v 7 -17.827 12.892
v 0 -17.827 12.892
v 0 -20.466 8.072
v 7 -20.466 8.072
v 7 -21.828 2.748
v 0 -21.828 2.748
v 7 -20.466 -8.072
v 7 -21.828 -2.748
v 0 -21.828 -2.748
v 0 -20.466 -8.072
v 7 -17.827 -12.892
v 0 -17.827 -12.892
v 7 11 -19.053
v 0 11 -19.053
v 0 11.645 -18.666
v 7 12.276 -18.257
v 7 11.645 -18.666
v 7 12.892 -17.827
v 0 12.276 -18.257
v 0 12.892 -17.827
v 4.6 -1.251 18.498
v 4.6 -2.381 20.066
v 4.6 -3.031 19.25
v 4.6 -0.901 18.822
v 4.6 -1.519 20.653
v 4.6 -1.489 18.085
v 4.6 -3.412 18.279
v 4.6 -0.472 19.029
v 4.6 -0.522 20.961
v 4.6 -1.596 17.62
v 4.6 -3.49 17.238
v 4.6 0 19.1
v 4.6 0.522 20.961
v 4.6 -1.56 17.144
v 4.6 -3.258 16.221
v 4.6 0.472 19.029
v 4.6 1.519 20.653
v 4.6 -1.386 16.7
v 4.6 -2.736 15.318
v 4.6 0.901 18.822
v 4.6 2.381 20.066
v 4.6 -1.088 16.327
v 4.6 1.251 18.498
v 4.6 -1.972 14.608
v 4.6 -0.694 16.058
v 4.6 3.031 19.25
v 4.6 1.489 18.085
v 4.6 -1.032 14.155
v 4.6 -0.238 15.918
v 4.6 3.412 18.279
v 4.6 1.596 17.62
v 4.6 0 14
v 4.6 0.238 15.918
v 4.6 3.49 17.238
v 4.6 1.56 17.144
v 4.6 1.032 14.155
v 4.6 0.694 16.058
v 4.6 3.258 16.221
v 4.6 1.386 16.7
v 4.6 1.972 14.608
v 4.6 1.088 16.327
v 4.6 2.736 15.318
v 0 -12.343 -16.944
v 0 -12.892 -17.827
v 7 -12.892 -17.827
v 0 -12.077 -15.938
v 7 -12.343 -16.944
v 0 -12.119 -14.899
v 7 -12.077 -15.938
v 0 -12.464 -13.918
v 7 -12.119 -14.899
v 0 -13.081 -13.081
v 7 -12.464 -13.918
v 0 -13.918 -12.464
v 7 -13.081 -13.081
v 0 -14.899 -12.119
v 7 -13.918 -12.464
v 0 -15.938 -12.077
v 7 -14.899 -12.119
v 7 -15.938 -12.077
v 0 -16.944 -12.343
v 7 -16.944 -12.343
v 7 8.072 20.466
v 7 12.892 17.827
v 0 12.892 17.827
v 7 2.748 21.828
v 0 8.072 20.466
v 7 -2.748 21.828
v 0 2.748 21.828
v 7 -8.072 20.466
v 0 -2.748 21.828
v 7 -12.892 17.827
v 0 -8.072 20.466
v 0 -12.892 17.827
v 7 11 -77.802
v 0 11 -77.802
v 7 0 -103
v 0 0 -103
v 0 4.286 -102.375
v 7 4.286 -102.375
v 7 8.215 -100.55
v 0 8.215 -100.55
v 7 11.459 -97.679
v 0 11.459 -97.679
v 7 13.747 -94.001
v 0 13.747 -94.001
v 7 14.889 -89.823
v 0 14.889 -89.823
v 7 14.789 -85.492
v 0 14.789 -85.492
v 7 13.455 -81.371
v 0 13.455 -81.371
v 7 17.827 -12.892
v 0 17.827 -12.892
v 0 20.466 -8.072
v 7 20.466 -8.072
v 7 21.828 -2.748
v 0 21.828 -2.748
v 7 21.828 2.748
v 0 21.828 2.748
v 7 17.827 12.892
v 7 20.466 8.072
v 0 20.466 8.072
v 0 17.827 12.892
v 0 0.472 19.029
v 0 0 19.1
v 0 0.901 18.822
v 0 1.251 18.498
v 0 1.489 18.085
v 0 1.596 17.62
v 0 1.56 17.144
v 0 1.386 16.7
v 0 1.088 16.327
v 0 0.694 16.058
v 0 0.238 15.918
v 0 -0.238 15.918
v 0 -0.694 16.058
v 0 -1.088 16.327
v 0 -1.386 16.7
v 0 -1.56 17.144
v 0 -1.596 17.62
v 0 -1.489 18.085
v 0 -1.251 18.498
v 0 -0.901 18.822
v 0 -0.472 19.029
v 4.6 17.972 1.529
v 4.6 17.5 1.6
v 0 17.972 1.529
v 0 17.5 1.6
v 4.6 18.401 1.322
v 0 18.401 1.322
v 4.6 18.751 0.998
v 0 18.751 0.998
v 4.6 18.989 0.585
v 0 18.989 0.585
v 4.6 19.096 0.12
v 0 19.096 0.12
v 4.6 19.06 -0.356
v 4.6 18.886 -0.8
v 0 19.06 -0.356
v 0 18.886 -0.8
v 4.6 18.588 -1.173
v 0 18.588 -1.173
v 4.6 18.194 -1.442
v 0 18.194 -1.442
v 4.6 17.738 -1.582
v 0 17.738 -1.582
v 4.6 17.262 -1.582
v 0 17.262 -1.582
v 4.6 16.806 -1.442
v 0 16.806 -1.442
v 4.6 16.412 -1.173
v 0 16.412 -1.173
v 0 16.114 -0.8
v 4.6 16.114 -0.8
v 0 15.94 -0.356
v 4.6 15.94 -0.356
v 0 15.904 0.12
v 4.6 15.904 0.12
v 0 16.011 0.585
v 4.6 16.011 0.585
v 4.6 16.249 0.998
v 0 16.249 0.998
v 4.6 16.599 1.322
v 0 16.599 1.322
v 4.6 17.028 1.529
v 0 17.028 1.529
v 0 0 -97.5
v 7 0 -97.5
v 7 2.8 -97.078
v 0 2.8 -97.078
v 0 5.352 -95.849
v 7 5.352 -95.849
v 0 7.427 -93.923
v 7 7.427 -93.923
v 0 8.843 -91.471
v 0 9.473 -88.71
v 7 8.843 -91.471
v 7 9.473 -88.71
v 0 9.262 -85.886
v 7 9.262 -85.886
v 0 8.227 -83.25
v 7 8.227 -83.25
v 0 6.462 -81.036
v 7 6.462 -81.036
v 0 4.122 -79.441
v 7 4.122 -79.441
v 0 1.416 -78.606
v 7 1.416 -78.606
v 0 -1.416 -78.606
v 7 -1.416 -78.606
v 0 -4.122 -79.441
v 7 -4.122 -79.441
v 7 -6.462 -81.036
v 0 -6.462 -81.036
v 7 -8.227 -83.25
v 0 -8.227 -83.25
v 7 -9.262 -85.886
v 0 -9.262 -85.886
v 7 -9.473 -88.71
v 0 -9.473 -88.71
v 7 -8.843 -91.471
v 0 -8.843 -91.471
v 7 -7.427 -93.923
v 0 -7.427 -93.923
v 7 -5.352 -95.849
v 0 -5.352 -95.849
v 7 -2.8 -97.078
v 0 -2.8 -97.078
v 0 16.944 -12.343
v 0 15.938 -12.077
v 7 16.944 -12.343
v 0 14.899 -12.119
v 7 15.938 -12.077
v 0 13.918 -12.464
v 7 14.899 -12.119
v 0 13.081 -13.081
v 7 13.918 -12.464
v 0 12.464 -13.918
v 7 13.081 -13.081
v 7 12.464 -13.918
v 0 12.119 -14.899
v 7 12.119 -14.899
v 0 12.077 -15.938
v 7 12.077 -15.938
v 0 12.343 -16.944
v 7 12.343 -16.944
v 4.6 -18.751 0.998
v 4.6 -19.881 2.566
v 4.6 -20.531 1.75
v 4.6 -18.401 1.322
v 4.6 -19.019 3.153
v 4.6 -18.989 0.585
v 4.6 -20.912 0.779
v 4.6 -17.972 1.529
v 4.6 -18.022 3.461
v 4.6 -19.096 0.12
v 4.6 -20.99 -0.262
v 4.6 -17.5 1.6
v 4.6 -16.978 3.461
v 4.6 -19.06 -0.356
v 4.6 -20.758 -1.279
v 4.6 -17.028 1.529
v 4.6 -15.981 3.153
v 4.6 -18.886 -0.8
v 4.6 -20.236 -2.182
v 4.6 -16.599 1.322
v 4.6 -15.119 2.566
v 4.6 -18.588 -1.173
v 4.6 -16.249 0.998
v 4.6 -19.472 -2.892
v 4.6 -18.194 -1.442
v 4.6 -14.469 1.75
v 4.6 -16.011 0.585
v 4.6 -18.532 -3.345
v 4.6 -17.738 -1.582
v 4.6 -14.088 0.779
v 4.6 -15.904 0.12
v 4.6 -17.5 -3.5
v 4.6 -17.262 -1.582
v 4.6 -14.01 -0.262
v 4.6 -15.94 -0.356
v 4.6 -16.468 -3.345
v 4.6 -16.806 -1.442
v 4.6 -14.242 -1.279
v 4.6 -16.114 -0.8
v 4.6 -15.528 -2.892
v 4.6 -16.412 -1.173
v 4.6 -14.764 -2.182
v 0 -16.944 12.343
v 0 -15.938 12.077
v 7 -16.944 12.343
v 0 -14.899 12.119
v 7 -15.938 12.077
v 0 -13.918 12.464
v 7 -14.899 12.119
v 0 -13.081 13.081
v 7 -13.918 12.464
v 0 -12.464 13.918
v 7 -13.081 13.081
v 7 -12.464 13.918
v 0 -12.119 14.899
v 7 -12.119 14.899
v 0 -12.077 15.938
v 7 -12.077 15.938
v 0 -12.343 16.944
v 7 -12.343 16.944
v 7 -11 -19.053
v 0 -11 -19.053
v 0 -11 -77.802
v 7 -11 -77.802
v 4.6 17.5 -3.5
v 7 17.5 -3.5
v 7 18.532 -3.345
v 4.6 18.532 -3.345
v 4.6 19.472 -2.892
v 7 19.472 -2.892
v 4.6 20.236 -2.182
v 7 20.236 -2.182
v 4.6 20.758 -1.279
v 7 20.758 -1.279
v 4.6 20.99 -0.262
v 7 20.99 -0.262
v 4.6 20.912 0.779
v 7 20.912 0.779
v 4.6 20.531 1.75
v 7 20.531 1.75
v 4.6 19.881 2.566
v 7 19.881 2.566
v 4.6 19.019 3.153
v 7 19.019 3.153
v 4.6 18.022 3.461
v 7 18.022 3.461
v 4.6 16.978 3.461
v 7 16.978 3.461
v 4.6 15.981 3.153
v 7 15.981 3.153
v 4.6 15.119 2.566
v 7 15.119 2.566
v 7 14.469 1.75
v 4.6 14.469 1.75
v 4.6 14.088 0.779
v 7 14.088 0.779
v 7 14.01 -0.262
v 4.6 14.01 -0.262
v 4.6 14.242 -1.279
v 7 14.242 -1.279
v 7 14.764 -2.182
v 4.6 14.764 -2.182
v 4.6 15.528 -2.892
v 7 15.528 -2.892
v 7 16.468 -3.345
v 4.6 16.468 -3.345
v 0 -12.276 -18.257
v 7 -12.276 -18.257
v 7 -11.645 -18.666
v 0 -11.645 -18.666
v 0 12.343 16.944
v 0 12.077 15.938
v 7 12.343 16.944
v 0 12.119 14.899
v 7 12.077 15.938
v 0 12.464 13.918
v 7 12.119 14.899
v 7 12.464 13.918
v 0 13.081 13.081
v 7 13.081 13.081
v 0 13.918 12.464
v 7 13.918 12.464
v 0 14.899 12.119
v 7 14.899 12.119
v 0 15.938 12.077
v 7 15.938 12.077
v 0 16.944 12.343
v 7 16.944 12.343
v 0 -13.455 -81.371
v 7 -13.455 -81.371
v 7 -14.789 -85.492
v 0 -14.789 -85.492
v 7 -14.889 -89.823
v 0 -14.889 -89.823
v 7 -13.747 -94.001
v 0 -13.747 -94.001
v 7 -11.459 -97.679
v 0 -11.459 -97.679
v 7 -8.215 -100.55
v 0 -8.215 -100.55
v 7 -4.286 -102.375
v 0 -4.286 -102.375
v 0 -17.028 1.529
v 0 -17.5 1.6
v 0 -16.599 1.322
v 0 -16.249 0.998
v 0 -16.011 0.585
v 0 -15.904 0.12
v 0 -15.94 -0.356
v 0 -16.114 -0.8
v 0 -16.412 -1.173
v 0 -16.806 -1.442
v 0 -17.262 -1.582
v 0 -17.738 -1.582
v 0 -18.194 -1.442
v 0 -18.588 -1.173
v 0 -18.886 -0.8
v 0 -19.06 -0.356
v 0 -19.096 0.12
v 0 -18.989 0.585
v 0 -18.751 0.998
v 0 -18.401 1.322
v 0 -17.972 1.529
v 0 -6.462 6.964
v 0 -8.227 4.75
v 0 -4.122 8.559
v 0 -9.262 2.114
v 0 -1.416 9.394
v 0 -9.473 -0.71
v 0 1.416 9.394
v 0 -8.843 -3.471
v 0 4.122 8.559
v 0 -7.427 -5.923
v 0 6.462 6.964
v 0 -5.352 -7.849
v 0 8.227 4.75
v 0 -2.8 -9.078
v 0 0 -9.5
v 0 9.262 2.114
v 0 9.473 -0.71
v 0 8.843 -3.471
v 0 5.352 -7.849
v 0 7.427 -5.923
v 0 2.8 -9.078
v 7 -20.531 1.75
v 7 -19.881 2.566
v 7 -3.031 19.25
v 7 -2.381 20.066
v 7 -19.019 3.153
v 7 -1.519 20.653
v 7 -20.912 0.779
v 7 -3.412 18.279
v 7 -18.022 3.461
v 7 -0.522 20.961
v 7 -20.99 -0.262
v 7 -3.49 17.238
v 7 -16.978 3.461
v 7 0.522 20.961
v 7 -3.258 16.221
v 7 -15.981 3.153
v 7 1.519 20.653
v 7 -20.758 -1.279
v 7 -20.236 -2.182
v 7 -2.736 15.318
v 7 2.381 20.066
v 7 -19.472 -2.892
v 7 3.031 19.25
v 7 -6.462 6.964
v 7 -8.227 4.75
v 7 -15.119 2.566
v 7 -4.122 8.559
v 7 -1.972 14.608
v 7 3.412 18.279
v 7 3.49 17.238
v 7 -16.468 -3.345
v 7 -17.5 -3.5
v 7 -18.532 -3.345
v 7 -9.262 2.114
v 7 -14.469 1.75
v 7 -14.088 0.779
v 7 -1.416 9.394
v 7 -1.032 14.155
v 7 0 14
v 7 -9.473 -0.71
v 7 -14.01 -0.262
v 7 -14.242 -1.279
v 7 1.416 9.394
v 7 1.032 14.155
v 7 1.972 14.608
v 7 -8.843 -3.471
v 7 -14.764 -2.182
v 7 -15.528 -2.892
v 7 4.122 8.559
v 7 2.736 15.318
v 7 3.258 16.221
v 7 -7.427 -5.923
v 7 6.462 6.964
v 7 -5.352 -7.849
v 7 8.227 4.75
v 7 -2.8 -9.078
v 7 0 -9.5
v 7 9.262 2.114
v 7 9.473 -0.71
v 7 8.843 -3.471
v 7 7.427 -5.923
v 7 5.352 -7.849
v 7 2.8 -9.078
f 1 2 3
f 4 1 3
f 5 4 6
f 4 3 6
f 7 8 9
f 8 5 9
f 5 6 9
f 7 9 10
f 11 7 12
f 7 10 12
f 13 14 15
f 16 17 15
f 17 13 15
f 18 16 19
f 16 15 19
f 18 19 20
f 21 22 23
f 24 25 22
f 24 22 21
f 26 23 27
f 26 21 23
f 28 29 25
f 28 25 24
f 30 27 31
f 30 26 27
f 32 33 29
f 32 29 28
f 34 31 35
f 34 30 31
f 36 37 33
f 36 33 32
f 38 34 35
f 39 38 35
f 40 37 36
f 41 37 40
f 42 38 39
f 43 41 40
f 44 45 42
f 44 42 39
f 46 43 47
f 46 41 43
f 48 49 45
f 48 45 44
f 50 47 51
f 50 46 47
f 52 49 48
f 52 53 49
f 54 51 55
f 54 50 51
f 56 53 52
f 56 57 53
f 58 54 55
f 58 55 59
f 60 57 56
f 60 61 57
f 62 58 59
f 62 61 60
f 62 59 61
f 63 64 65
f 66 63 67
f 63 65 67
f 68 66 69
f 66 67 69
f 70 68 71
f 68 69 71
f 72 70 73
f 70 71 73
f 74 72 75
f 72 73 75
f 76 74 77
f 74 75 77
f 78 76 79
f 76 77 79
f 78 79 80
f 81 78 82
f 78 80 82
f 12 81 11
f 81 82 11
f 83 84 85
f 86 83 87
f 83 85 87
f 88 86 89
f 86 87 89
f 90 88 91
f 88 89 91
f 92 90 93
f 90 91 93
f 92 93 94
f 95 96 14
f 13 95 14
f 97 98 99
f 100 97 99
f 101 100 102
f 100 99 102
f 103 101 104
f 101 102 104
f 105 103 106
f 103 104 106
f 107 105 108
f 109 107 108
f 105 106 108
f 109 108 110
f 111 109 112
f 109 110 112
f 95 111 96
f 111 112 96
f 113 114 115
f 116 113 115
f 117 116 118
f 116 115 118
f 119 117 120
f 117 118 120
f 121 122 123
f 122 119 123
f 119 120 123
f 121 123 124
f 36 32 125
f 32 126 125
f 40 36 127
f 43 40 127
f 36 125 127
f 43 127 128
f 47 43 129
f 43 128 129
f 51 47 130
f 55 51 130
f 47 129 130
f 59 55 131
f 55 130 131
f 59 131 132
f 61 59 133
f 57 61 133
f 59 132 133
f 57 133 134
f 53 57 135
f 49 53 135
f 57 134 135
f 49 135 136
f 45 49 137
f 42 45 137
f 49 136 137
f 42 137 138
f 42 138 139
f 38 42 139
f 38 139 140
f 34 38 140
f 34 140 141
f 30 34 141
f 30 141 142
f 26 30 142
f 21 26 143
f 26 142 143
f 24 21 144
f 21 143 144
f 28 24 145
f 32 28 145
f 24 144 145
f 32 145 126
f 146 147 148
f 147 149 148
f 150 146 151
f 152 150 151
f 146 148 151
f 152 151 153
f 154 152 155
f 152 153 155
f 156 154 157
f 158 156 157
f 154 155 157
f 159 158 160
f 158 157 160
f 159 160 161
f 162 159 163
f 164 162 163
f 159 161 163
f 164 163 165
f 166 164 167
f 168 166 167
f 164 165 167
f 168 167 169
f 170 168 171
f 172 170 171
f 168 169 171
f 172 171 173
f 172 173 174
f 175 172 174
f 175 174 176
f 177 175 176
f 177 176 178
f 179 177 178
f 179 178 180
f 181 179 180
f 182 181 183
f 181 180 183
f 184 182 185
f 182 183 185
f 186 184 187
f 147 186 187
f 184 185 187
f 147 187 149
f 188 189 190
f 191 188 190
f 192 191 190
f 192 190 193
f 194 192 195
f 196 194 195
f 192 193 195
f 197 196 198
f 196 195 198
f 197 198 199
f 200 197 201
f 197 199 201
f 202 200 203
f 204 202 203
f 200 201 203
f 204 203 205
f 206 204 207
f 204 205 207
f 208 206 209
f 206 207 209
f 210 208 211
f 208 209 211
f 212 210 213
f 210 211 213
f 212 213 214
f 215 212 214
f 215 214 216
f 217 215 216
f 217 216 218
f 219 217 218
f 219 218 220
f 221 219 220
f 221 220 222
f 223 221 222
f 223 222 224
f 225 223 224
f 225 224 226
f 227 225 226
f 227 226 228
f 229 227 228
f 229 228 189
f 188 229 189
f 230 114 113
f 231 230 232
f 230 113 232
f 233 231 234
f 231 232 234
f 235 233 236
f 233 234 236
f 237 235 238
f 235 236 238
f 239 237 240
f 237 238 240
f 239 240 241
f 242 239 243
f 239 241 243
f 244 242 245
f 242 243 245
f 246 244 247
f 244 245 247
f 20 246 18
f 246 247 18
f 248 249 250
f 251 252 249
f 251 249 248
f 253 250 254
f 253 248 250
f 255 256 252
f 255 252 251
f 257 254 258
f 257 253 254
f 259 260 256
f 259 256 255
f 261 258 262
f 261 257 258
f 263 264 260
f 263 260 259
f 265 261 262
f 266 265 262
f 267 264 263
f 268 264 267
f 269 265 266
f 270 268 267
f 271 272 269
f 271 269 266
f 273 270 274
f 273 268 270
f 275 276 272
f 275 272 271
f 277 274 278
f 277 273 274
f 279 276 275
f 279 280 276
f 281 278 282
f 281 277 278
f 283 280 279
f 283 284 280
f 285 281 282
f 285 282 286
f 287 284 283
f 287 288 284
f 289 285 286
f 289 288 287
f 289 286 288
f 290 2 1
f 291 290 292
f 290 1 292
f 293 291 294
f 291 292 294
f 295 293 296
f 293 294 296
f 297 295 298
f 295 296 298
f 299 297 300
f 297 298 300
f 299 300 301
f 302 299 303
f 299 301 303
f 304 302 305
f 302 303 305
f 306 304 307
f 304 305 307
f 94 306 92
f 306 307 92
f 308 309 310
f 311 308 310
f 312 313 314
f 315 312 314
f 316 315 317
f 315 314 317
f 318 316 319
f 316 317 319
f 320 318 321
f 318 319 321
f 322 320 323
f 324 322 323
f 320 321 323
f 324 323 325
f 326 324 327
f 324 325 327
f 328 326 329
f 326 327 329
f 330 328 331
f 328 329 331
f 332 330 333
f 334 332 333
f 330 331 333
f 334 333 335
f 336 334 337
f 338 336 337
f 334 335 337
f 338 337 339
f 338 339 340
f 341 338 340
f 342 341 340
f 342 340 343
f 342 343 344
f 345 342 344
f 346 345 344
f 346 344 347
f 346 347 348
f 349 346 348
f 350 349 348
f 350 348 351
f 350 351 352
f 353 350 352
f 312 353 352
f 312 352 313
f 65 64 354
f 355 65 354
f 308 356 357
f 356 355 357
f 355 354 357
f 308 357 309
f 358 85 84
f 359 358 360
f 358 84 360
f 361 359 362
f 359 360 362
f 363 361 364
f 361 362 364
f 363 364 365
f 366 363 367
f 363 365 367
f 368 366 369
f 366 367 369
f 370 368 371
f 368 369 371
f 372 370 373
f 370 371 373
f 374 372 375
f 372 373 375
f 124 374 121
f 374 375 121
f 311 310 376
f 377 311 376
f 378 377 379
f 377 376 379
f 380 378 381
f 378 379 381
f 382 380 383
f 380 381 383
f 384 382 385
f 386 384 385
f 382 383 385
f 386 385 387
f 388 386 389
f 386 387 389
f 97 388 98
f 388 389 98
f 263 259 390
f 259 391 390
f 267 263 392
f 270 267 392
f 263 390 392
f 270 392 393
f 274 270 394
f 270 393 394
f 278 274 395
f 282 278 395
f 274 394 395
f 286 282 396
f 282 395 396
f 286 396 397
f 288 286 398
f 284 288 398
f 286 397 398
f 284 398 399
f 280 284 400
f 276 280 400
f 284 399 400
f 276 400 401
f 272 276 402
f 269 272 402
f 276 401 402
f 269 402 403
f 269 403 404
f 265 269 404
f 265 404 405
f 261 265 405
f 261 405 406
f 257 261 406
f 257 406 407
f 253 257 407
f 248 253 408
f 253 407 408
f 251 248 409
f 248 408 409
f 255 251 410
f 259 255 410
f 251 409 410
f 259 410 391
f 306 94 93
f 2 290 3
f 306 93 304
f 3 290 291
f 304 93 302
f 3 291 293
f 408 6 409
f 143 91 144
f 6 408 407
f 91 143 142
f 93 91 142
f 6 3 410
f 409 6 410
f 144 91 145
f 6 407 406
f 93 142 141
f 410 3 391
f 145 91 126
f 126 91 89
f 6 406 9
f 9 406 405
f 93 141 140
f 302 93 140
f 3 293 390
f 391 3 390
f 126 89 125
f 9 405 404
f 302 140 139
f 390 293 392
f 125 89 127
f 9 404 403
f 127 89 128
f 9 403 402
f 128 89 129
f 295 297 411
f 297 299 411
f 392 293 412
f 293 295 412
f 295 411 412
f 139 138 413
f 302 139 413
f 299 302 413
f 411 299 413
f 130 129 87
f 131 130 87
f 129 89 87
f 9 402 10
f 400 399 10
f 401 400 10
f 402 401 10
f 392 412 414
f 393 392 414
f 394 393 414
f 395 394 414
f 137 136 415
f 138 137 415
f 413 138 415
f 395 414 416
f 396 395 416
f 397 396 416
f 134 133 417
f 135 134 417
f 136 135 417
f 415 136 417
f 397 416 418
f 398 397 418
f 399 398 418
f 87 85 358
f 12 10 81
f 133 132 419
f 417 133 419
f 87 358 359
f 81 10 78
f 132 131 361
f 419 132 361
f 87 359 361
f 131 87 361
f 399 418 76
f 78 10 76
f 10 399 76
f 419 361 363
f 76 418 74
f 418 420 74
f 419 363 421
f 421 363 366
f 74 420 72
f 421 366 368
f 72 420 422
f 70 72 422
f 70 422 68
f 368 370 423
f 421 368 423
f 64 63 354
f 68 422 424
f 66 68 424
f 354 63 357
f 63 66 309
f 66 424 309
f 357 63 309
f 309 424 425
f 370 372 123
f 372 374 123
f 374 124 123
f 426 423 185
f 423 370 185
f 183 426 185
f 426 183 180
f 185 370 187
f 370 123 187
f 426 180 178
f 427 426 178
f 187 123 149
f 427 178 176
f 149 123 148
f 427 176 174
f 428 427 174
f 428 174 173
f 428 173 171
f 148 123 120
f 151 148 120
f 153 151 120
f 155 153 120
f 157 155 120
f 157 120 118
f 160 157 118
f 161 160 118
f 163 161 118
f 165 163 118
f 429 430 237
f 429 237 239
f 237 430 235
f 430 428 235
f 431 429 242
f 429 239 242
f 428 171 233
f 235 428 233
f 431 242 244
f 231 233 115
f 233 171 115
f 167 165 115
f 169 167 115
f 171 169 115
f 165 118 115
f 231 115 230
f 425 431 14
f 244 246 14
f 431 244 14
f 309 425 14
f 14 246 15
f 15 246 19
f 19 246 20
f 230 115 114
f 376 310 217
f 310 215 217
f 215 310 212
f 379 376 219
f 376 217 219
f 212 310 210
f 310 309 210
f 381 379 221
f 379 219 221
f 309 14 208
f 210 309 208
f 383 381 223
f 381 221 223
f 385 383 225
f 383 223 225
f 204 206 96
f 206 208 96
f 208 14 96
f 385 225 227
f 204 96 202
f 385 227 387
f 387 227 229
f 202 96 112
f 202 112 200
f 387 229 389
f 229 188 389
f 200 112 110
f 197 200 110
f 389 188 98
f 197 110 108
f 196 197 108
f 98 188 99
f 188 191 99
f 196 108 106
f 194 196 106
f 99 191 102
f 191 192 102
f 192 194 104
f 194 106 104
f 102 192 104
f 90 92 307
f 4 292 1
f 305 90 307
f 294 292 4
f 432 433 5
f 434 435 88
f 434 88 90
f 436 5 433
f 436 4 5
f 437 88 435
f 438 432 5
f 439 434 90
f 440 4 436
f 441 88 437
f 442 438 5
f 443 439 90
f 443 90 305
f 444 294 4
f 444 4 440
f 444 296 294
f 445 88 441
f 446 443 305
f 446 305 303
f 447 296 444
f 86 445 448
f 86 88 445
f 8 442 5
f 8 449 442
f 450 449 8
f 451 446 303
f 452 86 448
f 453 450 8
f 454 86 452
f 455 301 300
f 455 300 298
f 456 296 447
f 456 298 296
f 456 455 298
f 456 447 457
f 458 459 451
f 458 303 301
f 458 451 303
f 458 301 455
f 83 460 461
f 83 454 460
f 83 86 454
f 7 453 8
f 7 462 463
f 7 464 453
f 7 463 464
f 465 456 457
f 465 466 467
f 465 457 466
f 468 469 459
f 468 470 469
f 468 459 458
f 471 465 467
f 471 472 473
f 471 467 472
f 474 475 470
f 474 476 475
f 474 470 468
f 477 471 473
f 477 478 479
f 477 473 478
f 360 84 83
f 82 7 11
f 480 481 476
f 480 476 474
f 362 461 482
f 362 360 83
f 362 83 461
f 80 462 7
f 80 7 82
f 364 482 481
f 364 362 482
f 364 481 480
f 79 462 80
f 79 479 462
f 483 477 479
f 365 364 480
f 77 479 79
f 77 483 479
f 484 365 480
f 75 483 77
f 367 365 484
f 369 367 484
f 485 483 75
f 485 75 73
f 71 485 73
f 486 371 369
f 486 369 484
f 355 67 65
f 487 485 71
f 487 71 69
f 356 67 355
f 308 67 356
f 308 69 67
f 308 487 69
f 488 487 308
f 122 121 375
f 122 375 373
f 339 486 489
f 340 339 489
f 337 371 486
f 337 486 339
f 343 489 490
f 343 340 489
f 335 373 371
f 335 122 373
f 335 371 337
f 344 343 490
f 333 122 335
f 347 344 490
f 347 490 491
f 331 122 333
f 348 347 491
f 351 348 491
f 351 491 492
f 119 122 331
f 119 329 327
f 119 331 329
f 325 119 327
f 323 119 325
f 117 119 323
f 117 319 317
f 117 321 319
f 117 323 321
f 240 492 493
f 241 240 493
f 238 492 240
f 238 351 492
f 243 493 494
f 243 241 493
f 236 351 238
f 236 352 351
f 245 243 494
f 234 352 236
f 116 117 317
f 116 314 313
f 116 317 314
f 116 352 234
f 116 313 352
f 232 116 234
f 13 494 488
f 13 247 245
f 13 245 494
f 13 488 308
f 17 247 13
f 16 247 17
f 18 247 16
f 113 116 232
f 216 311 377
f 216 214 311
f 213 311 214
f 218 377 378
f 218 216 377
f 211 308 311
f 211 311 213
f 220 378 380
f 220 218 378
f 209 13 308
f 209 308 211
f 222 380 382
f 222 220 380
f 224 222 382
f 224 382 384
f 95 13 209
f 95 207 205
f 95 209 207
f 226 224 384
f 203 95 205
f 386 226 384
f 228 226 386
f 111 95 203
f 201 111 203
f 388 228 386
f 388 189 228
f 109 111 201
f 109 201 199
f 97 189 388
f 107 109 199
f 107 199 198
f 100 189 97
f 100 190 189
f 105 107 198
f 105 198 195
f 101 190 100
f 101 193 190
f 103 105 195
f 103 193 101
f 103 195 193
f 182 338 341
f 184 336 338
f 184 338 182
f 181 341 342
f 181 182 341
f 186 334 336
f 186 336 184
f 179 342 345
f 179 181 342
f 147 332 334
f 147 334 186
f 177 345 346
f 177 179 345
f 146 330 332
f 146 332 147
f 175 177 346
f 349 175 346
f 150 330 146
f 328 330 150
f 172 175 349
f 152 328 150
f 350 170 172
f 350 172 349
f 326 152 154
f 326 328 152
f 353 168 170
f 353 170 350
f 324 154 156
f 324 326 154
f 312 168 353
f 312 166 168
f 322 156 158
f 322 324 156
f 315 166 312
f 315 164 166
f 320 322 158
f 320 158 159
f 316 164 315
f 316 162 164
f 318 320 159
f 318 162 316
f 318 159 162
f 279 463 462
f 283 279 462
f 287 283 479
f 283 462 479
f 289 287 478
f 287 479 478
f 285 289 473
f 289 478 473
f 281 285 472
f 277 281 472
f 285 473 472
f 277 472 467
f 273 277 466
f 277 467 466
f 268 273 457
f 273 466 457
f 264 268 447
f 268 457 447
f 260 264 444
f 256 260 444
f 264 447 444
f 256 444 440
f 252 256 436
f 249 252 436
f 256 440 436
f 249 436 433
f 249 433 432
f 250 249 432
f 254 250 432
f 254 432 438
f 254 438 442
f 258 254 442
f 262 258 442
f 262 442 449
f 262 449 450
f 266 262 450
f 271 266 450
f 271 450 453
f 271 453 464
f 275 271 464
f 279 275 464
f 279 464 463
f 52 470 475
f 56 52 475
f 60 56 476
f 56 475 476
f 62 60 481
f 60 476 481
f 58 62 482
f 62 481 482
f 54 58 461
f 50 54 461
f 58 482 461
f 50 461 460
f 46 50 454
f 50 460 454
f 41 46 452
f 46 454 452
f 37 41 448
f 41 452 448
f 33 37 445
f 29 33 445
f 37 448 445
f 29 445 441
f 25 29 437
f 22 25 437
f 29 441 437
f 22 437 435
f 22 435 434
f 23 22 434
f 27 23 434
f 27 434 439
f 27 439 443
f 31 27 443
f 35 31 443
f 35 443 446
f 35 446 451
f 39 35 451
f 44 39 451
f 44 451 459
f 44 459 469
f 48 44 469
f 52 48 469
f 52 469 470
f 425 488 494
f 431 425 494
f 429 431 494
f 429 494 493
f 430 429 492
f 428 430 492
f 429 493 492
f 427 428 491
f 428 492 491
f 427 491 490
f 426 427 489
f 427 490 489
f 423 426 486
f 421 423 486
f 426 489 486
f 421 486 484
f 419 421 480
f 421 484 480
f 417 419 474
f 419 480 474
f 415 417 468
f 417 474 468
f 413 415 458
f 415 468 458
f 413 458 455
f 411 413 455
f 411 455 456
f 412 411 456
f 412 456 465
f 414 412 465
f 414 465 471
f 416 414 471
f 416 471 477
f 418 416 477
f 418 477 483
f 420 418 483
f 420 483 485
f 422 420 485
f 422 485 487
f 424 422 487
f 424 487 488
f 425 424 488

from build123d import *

# Parameters (mm, degrees)
BOSS_EXTRUDE1_DEPTH                              = 7
CBORE_FOR_M3_PAN_HEAD_MACHINE_SCREW1_D           = 3.2
CBORE_FOR_M3_PAN_HEAD_MACHINE_SCREW1_CBORE_D     = 7
CBORE_FOR_M3_PAN_HEAD_MACHINE_SCREW1_CBORE_DEPTH = 2.4
SKETCH5_R                                        = 9.5
CUT_EXTRUDE1_DEPTH                               = 1
CUT_EXTRUDE1_DEPTH_BACK                          = 8
SKETCH6_R                                        = 3.5
CUT_EXTRUDE2_DEPTH                               = 1
CUT_EXTRUDE2_DEPTH_BACK                          = 8
SKETCH7_R                                        = 9.5
CUT_EXTRUDE3_DEPTH                               = 1
CUT_EXTRUDE3_DEPTH_BACK                          = 8


with BuildPart() as part:
    # Sketch1 → Boss-Extrude1 (new body)
    with BuildSketch(Plane(origin=(0, 0, 0), x_dir=(0, 0, -1), z_dir=(1, 0, 0))):
        with BuildLine():
            ThreePointArc((77.801960973, 11), (73, 0), (77.801960973, -11))
            Line((77.801960973, -11), (88, -11))
            Line((88, -11), (88, 11))
            Line((88, 11), (77.801960973, 11))
        make_face()
        with BuildLine():
            Line((88, -11), (77.801960973, -11))
            ThreePointArc((77.801960973, -11), (94.001225483, -13.747192175), (103, 0))
            ThreePointArc((103, 0), (94.001225483, 13.747192175), (77.801960973, 11))
            Line((77.801960973, 11), (88, 11))
            Line((88, 11), (88, -11))
        make_face()
        with BuildLine():
            ThreePointArc((22, 0), (21.250368178, -5.694018992), (19.052558883, -11))
            Line((19.052558883, -11), (77.801960973, -11))
            ThreePointArc((77.801960973, -11), (73, 0), (77.801960973, 11))
            Line((77.801960973, 11), (19.052558883, 11))
            ThreePointArc((19.052558883, 11), (21.250368178, 5.694018992), (22, 0))
        make_face()
        with BuildLine():
            Line((0, 11), (0, -11))
            Line((0, -11), (19.052558883, -11))
            ThreePointArc((19.052558883, -11), (21.250368178, -5.694018992), (22, 0))
            ThreePointArc((22, 0), (21.250368178, 5.694018992), (19.052558883, 11))
            Line((19.052558883, 11), (0, 11))
        make_face()
        with BuildLine():
            Line((19.052558883, -11), (0, -11))
            Line((0, -11), (0, 11))
            Line((0, 11), (19.052558883, 11))
            ThreePointArc((19.052558883, 11), (-22, 0), (19.052558883, -11))
        make_face()
    extrude(amount=BOSS_EXTRUDE1_DEPTH)

    # CBORE for M3 Pan Head Machine Screw1 (through all)
    with Locations(Plane(origin=(7, 0, 0), x_dir=(0, 0, -1), z_dir=(1, 0, 0))):
        with Locations((0, -17.5), (0, 17.5), (-17.5, 0)):
            CounterBoreHole(CBORE_FOR_M3_PAN_HEAD_MACHINE_SCREW1_D / 2, CBORE_FOR_M3_PAN_HEAD_MACHINE_SCREW1_CBORE_D / 2, CBORE_FOR_M3_PAN_HEAD_MACHINE_SCREW1_CBORE_DEPTH)

    # Sketch5 → Cut-Extrude1 (cut, two sides)
    with BuildSketch(Plane(origin=(7, 0, 0), x_dir=(0, 0, -1), z_dir=(1, 0, 0))) as cut_extrude1_sk:
        Circle(SKETCH5_R)
    extrude(amount=CUT_EXTRUDE1_DEPTH, mode=Mode.SUBTRACT)
    extrude(cut_extrude1_sk.sketch, amount=-CUT_EXTRUDE1_DEPTH_BACK, mode=Mode.SUBTRACT)

    # Sketch6 → Cut-Extrude2 (cut, two sides)
    with BuildSketch(Plane(origin=(7, 0, 0), x_dir=(0, 0, -1), z_dir=(1, 0, 0))) as cut_extrude2_sk:
        with Locations((15.556349186, 15.556349186)):
            Circle(SKETCH6_R)
        with Locations((-15.556349186, 15.556349186)):
            Circle(SKETCH6_R)
        with Locations((-15.556349186, -15.556349186)):
            Circle(SKETCH6_R)
        with Locations((15.556349186, -15.556349186)):
            Circle(SKETCH6_R)
    extrude(amount=CUT_EXTRUDE2_DEPTH, mode=Mode.SUBTRACT)
    extrude(cut_extrude2_sk.sketch, amount=-CUT_EXTRUDE2_DEPTH_BACK, mode=Mode.SUBTRACT)

    # Sketch7 → Cut-Extrude3 (cut, two sides)
    with BuildSketch(Plane(origin=(7, 0, 0), x_dir=(0, 0, -1), z_dir=(1, 0, 0))) as cut_extrude3_sk:
        with Locations((88, 0)):
            Circle(SKETCH7_R)
    extrude(amount=CUT_EXTRUDE3_DEPTH, mode=Mode.SUBTRACT)
    extrude(cut_extrude3_sk.sketch, amount=-CUT_EXTRUDE3_DEPTH_BACK, mode=Mode.SUBTRACT)


solid = part.part
